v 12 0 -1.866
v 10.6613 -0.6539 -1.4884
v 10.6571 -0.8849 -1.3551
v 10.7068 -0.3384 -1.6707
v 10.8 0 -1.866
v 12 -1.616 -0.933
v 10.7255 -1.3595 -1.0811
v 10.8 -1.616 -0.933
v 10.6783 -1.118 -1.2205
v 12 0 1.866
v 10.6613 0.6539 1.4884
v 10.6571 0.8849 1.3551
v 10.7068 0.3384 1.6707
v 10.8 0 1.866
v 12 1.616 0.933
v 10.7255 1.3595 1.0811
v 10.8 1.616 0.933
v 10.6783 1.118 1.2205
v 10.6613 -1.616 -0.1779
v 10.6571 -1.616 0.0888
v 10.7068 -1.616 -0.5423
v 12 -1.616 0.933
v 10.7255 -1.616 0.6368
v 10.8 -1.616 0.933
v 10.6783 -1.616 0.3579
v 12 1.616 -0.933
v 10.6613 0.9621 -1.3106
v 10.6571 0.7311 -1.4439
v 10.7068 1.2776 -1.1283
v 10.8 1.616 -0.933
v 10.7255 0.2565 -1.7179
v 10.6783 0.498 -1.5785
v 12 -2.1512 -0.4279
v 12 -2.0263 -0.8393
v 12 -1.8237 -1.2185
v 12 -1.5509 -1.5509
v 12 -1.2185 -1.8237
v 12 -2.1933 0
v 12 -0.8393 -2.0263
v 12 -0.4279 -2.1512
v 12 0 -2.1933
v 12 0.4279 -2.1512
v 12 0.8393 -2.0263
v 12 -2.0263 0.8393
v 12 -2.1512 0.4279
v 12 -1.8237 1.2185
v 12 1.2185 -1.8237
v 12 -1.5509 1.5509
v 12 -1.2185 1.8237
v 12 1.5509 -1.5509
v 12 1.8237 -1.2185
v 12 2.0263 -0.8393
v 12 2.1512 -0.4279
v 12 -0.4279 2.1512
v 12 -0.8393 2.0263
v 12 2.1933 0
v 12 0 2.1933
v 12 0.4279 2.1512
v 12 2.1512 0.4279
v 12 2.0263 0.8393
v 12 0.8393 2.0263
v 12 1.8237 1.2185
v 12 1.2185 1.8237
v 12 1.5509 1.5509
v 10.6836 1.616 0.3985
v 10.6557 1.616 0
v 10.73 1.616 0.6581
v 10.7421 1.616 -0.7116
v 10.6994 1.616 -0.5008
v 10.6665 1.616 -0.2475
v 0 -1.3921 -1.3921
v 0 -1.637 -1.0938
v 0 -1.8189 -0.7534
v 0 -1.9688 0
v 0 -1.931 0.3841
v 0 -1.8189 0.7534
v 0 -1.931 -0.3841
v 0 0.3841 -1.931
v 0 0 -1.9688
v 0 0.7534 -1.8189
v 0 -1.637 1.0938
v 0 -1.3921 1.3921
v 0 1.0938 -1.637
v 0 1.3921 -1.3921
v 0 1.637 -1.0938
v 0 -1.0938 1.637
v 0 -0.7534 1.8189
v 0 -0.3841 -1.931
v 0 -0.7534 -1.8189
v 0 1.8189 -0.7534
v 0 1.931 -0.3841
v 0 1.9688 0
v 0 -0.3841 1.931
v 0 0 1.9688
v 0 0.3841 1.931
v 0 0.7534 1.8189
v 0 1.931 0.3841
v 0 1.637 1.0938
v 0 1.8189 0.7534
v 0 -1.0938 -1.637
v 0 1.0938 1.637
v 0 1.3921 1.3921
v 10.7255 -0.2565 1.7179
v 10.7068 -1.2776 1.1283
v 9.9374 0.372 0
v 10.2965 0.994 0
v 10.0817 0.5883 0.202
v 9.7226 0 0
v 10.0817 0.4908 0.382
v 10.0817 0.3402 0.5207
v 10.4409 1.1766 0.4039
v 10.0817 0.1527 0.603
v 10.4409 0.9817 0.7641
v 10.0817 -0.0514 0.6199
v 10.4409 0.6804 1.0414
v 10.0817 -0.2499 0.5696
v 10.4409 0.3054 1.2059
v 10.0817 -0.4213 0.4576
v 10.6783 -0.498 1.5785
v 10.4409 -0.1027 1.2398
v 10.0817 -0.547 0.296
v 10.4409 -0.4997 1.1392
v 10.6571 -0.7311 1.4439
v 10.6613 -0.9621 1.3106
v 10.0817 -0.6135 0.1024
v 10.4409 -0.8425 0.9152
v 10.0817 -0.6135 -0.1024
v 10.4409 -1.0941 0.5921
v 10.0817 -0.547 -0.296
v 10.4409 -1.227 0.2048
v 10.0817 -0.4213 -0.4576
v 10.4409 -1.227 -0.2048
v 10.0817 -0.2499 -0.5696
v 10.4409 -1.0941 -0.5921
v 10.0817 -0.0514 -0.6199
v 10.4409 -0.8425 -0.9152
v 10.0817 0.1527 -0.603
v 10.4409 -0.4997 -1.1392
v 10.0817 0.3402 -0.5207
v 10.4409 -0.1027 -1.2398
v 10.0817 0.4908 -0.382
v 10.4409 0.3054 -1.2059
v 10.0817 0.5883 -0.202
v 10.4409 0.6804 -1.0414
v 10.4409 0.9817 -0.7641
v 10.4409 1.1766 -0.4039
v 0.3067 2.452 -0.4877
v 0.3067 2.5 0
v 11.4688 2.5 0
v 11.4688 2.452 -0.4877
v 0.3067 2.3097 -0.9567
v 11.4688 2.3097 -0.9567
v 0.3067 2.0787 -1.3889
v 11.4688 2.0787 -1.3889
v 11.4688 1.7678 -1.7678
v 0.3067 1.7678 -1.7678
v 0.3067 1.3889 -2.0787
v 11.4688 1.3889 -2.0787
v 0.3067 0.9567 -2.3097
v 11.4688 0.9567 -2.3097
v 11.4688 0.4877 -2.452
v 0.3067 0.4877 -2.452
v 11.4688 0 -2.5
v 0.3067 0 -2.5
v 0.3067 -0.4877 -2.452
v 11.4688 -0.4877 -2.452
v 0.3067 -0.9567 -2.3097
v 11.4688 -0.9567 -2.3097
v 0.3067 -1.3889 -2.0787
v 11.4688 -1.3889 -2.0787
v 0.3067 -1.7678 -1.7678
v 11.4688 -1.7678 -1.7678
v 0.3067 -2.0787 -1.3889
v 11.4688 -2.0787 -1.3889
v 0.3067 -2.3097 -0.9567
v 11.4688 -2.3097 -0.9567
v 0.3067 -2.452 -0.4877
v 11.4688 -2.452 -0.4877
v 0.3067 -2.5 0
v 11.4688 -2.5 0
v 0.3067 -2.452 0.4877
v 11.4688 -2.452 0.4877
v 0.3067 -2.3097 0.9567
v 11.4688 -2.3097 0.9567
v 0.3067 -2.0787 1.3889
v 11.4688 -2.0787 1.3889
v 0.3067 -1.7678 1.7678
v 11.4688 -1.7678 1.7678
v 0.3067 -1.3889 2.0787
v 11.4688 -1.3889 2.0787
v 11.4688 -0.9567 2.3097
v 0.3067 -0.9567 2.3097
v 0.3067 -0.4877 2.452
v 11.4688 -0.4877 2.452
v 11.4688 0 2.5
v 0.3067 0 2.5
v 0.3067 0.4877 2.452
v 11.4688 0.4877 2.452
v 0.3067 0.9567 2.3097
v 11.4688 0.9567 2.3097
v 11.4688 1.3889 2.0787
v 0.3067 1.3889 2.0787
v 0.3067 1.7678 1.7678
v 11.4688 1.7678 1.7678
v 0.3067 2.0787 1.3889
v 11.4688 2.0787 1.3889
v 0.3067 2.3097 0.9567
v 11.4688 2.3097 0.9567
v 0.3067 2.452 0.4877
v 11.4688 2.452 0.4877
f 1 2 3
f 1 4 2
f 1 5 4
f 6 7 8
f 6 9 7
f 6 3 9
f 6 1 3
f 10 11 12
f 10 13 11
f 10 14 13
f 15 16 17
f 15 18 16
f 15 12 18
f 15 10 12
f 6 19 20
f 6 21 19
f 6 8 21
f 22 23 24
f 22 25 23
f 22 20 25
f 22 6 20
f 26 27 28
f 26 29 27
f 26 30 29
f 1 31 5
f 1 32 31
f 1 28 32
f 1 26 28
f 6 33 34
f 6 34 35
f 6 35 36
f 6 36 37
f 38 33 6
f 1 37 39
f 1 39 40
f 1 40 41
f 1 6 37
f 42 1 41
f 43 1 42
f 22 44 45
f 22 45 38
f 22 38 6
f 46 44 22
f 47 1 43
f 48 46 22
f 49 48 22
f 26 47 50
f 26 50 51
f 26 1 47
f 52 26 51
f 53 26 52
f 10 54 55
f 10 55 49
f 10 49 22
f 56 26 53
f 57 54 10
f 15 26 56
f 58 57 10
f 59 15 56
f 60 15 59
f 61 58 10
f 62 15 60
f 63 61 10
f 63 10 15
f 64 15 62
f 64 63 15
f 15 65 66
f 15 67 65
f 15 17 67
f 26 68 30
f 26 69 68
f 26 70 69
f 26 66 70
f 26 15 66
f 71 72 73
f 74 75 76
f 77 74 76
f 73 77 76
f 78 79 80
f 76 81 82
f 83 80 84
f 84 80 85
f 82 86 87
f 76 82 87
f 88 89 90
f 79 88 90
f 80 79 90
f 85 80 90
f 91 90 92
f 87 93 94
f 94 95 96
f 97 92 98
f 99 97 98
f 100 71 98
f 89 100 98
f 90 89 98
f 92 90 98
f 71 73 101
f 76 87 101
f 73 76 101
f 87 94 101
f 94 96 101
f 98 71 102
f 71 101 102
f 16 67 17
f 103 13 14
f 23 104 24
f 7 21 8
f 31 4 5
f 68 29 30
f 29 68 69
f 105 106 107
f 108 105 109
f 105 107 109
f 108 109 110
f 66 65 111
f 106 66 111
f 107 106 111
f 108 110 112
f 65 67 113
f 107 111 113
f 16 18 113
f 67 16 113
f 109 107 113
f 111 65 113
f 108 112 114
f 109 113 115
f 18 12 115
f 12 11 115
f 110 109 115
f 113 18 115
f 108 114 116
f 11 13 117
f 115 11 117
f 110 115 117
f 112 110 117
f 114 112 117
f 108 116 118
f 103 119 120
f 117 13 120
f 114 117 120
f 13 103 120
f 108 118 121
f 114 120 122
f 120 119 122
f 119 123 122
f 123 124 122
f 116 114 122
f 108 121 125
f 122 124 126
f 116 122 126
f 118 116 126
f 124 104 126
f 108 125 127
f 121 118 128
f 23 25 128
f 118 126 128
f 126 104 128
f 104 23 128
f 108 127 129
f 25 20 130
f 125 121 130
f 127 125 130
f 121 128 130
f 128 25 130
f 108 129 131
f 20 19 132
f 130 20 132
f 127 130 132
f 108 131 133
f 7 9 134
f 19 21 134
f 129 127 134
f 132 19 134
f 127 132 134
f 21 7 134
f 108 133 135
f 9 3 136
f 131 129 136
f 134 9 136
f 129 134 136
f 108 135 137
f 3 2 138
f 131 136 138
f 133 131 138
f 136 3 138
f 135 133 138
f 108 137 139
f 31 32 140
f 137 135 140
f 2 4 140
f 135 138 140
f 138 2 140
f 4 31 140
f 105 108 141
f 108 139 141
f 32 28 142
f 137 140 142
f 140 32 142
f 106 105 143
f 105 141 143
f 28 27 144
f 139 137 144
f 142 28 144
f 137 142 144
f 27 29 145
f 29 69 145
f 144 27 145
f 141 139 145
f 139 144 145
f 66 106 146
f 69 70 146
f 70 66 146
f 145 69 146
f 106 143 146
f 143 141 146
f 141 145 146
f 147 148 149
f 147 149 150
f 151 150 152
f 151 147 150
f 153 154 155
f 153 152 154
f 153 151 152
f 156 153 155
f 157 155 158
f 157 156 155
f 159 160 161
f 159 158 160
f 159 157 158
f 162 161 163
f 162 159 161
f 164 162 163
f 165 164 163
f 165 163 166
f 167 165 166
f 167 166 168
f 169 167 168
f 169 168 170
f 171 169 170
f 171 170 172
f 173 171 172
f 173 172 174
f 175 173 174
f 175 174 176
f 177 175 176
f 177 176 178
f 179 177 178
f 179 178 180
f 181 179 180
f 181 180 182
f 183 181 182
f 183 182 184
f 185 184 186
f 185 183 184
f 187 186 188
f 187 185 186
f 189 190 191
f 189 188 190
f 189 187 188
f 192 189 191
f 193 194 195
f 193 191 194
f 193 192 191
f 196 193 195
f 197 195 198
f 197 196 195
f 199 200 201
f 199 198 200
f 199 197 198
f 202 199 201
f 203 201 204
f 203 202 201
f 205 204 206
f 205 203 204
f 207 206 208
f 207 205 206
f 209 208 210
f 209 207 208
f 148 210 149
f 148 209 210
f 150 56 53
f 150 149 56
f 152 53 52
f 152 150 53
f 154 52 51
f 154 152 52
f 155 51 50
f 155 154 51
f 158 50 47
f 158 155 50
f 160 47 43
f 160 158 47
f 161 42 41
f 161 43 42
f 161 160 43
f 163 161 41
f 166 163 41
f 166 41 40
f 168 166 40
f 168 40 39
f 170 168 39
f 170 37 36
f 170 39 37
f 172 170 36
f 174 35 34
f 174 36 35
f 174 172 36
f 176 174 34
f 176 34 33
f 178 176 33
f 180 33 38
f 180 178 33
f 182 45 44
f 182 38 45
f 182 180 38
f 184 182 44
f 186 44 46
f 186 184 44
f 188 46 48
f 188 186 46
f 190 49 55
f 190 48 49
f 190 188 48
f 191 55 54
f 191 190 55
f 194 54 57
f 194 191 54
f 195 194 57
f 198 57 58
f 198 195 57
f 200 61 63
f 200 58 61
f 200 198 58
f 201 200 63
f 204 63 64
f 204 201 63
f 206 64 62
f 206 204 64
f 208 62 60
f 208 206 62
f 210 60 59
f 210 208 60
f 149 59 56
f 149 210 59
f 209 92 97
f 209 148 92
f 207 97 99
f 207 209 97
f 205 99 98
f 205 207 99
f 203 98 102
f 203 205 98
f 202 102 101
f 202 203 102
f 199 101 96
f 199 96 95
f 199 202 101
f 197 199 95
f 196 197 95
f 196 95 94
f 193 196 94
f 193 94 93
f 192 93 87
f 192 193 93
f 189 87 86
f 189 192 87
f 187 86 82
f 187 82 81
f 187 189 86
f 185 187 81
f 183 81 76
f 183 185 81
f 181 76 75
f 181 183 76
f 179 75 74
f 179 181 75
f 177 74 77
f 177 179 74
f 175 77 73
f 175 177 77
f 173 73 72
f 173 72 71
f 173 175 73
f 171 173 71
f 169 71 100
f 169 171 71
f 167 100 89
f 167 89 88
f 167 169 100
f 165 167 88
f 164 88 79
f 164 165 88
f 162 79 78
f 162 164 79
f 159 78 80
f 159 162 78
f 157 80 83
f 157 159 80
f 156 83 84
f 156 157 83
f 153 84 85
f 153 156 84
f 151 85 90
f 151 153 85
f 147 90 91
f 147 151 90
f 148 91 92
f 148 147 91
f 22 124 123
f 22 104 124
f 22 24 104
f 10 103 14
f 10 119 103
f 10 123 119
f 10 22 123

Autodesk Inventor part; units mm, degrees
ref_plane "YZ Plane" through (0, 0, 0) normal (1, 0, 0) x (0, 1, 0)
ref_plane "XZ Plane" through (0, 0, 0) normal (0, 1, 0) x (-1, 0, 0)
sketch "Sketch1" plane through (0, 0, 0) normal (0, 0, 1) x (1, 0, 0)
  line L0 (0, 0) -> (9.7226, 0)
  line L1 (12, 1.866) -> (12, 2.5)
  line L2 (12, 2.5) -> (0, 2.5)
  line L3 (12, 1.866) -> (10.8, 1.866)
  line L4 (10.8, 1.866) -> (9.7226, 0)
  line L5 (0, -0.5) -> (0, 3) projected
  line L6 (0, 2.5) -> (0, 0)
  dimension "d0" = 1.2
  dimension "d1" = 60
  dimension "d2" = 5
  dimension "d3" = 3.7321
  dimension "d5" = 12
revolve "Body" add sketch "Sketch1" angle 360 about axis through (0, 0, 0) along (1, 0, 0)
chamfer "Chamfer1" distance 0.3067 angle 60 1 edges at (12, -2.5, 0) measured on face at (12, 2.2645, -0.1994)
sketch "Sketch2" plane through (12, 0, 0) normal (1, 0, 0) x (0, 0, -1)
  circle A0 centre (0, 0) radius 1.866 projected
  line L0 (-0.933, 1.616) -> (0.933, 1.616)
  line L1 (0.933, 1.616) -> (1.866, 0)
  line L2 (1.866, 0) -> (0.933, -1.616)
  line L3 (0.933, -1.616) -> (-0.933, -1.616)
  line L4 (-0.933, -1.616) -> (-1.866, 0)
  line L5 (-1.866, 0) -> (-0.933, 1.616)
  point P0 (0, 0)
  point P1 (0, 0)
extrude "Slot" add sketch "Sketch2" against normal up to next contours L1 A0 | A0 L2 | L0 A0 | A0 L3 | L5 A0 | A0 L4
thread "Thread" size "M5x0.8" class "6g" standard "ISO Metric profile" length 12
chamfer "Chamfer2" distance 0.3067 angle 60 1 edges at (0, -2.5, 0) measured on face at (3.8229, 2.4919, -0.2012)
ref_plane "Work Plane1" through (6, 0, 0) normal (0, 0.5, 0.866) x (1, 0, 0)
equation "\"d0\" = INTI"
equation "\"d7\" = -0.5 * GD1 + 0.5 * NND"
equation "\"d8\" = FAWI"
equation "\"d29\" = -0.5 * GD1 + 0.5 * NND"
equation "\"d13\" = -0.5 * GD1 + 0.5 * NND"
equation "\"d14\" = FAWI"
equation "\"d30\" = -0.5 * GD1 + 0.5 * NND"
equation "\"NND\" = 3"
equation "\"NLG\" = 3"
equation "\"INTI\" = 1.2"
equation "\"FAWI\" = 60deg"
equation "\"SW\" = 1.5"
equation "\"GD1\" = THREADDIA - 1.2269 * PTC"
equation "\"FAWI1\" = 45deg"
equation "\"GUL\" = 0.61345 * PTC"
equation "\"SPD\" = 2"
equation "\"SEWI\" = 120deg"
equation "\"TOA\" = 30deg"
equation "\"THREADDIA\" = 3"
equation "\"PTC\" = 0.5"
equation "\"GAL\" = 0.61345 * PTC"
equation "\"E0\" = 1.155 * SW"
properties part number "Grub Screw 5x12mm" material "Stainless Steel, 440C"
